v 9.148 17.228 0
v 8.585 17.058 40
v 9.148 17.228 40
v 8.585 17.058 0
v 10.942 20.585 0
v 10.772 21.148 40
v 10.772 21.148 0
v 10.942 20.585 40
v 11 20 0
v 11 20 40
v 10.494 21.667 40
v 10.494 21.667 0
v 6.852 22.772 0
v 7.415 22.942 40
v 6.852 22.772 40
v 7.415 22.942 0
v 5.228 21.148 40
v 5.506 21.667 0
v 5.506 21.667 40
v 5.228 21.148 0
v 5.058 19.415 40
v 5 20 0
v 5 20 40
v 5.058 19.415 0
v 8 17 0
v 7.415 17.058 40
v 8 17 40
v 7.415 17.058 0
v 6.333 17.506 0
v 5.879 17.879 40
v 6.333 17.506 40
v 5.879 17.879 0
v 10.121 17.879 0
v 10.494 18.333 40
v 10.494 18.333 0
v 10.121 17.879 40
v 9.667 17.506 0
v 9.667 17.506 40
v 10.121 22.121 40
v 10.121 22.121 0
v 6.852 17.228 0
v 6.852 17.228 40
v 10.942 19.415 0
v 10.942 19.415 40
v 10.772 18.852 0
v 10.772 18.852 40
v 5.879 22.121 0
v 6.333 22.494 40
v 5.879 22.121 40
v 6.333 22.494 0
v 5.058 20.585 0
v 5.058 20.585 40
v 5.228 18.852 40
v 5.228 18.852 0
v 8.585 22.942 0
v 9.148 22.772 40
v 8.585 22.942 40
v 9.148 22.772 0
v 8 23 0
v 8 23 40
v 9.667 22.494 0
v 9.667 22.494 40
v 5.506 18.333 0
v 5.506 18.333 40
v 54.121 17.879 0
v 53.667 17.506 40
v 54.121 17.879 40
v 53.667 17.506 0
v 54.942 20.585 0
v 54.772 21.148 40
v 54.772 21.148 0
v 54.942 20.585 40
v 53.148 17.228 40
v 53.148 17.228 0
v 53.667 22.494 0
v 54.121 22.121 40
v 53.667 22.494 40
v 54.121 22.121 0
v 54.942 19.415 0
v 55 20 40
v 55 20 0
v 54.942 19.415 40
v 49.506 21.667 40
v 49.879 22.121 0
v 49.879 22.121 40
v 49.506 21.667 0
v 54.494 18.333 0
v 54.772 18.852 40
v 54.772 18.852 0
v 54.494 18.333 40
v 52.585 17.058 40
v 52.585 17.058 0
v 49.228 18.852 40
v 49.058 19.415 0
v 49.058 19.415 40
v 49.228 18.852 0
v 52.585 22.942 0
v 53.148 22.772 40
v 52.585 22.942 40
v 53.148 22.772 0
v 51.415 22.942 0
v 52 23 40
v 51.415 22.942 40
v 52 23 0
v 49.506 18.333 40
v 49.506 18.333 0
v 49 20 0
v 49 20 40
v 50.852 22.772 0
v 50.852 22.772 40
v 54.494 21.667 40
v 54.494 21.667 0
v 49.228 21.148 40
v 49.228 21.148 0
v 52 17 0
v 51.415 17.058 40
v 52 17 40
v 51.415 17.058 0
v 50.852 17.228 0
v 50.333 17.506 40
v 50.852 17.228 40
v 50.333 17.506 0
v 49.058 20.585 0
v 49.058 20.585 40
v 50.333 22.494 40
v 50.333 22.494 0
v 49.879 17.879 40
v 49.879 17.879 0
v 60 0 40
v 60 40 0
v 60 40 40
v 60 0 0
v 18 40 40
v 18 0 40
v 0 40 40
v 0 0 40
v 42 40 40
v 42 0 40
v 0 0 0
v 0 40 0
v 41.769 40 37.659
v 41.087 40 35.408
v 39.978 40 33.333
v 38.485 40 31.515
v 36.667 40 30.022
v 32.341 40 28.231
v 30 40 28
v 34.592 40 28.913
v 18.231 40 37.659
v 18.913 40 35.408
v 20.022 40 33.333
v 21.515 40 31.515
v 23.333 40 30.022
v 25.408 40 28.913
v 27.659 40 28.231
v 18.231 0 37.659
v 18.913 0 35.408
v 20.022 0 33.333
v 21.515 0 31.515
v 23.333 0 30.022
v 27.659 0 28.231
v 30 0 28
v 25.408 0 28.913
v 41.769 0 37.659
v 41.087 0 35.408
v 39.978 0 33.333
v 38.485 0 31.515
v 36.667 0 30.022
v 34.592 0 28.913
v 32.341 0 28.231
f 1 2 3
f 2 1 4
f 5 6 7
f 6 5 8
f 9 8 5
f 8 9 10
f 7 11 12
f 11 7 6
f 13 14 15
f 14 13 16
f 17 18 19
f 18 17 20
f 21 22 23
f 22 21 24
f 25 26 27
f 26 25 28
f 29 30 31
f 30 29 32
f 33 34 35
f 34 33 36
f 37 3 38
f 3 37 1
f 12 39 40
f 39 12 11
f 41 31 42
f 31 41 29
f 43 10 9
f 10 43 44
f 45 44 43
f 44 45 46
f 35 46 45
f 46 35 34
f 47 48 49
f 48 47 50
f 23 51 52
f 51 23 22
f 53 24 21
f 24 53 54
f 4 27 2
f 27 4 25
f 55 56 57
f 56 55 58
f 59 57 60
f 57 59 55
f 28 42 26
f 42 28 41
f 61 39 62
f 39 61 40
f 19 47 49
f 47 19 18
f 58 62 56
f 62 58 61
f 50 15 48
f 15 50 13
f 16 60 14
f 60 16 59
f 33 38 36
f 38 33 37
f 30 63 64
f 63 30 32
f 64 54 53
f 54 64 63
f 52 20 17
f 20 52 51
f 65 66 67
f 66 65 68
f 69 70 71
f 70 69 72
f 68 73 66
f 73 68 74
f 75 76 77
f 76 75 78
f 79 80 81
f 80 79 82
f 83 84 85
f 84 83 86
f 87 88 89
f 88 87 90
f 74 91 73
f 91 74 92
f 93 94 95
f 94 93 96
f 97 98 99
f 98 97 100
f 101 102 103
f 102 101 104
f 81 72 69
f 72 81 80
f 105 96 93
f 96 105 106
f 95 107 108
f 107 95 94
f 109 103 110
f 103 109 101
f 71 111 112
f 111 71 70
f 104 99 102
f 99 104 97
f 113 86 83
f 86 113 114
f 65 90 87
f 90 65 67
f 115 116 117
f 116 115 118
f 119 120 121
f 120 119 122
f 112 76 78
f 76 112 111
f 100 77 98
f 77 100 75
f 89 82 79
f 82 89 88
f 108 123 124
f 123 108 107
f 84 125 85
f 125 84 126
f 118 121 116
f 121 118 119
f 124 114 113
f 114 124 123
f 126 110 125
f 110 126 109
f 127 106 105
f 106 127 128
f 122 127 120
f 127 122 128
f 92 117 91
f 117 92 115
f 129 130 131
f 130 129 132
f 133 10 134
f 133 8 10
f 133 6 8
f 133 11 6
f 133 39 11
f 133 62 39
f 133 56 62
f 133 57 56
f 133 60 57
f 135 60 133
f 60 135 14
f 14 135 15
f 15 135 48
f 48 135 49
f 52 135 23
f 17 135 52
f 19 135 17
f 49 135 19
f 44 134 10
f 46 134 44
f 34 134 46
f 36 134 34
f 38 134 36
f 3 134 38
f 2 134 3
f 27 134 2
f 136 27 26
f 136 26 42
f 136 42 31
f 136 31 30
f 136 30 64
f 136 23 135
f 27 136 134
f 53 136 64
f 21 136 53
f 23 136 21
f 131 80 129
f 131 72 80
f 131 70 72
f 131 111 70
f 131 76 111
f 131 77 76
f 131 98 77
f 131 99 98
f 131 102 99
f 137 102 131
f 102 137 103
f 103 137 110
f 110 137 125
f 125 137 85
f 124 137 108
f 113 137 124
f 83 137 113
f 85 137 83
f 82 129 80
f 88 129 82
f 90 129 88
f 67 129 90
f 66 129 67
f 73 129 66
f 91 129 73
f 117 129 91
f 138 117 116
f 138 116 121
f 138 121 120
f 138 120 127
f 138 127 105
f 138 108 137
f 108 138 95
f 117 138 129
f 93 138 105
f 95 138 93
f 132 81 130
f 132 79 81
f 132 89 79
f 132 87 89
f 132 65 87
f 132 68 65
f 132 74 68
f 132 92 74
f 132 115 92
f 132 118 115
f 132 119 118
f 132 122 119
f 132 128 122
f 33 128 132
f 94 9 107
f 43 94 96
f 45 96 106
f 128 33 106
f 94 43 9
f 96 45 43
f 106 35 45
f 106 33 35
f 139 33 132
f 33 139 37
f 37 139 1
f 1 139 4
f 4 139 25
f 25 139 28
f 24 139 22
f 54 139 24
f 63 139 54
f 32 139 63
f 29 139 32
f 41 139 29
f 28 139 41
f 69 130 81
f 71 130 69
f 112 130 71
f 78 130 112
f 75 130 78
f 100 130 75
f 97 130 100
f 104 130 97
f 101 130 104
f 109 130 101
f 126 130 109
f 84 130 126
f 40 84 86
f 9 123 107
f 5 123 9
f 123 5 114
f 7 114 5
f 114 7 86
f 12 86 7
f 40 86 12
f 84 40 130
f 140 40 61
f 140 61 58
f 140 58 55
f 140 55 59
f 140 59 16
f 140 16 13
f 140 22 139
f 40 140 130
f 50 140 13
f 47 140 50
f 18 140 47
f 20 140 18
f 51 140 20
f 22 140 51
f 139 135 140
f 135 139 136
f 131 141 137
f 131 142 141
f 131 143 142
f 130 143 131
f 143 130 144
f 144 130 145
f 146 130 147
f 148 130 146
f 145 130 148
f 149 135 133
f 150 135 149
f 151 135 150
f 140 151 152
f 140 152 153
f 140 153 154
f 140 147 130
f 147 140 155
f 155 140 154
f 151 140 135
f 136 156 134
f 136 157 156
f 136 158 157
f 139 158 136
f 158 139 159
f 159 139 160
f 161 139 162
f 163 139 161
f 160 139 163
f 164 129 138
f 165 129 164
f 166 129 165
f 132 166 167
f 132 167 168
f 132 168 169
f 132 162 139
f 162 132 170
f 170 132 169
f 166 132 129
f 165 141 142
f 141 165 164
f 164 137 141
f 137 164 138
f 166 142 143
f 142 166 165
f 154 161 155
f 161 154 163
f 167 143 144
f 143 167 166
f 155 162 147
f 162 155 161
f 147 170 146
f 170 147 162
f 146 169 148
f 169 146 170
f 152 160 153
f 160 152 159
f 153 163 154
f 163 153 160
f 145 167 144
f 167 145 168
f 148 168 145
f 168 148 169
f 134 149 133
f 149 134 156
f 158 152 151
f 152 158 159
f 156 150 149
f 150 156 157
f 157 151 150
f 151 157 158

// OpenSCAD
$fn = 32;

// ----------------------------------------------------------------------
// Saddle clamp: plain shaft clamp
// ----------------------------------------------------------------------

// --- parameters (mm) ---
blk_l = 60;               // block length, X
blk_w = 40;               // block width, Y
blk_h = 40;               // block height
clamp_r = 12;             // shaft groove radius
hole_r = 3;               // bolt hole radius
hole_m = 8;               // bolt hole margin from the ends

saw_depth = clamp_r + 3;  // saw kerf depth

difference() {
  cube([blk_l, blk_w, blk_h]);
  translate([blk_l / 2, -1, blk_h])
    rotate([-90, 0, 0])
      cylinder(h = blk_w + 2, r = clamp_r);
  for (sx = [0, 1])
    translate([sx ? blk_l - hole_m : hole_m, blk_w / 2, -1])
      cylinder(r = hole_r, h = blk_h + 2);
}
